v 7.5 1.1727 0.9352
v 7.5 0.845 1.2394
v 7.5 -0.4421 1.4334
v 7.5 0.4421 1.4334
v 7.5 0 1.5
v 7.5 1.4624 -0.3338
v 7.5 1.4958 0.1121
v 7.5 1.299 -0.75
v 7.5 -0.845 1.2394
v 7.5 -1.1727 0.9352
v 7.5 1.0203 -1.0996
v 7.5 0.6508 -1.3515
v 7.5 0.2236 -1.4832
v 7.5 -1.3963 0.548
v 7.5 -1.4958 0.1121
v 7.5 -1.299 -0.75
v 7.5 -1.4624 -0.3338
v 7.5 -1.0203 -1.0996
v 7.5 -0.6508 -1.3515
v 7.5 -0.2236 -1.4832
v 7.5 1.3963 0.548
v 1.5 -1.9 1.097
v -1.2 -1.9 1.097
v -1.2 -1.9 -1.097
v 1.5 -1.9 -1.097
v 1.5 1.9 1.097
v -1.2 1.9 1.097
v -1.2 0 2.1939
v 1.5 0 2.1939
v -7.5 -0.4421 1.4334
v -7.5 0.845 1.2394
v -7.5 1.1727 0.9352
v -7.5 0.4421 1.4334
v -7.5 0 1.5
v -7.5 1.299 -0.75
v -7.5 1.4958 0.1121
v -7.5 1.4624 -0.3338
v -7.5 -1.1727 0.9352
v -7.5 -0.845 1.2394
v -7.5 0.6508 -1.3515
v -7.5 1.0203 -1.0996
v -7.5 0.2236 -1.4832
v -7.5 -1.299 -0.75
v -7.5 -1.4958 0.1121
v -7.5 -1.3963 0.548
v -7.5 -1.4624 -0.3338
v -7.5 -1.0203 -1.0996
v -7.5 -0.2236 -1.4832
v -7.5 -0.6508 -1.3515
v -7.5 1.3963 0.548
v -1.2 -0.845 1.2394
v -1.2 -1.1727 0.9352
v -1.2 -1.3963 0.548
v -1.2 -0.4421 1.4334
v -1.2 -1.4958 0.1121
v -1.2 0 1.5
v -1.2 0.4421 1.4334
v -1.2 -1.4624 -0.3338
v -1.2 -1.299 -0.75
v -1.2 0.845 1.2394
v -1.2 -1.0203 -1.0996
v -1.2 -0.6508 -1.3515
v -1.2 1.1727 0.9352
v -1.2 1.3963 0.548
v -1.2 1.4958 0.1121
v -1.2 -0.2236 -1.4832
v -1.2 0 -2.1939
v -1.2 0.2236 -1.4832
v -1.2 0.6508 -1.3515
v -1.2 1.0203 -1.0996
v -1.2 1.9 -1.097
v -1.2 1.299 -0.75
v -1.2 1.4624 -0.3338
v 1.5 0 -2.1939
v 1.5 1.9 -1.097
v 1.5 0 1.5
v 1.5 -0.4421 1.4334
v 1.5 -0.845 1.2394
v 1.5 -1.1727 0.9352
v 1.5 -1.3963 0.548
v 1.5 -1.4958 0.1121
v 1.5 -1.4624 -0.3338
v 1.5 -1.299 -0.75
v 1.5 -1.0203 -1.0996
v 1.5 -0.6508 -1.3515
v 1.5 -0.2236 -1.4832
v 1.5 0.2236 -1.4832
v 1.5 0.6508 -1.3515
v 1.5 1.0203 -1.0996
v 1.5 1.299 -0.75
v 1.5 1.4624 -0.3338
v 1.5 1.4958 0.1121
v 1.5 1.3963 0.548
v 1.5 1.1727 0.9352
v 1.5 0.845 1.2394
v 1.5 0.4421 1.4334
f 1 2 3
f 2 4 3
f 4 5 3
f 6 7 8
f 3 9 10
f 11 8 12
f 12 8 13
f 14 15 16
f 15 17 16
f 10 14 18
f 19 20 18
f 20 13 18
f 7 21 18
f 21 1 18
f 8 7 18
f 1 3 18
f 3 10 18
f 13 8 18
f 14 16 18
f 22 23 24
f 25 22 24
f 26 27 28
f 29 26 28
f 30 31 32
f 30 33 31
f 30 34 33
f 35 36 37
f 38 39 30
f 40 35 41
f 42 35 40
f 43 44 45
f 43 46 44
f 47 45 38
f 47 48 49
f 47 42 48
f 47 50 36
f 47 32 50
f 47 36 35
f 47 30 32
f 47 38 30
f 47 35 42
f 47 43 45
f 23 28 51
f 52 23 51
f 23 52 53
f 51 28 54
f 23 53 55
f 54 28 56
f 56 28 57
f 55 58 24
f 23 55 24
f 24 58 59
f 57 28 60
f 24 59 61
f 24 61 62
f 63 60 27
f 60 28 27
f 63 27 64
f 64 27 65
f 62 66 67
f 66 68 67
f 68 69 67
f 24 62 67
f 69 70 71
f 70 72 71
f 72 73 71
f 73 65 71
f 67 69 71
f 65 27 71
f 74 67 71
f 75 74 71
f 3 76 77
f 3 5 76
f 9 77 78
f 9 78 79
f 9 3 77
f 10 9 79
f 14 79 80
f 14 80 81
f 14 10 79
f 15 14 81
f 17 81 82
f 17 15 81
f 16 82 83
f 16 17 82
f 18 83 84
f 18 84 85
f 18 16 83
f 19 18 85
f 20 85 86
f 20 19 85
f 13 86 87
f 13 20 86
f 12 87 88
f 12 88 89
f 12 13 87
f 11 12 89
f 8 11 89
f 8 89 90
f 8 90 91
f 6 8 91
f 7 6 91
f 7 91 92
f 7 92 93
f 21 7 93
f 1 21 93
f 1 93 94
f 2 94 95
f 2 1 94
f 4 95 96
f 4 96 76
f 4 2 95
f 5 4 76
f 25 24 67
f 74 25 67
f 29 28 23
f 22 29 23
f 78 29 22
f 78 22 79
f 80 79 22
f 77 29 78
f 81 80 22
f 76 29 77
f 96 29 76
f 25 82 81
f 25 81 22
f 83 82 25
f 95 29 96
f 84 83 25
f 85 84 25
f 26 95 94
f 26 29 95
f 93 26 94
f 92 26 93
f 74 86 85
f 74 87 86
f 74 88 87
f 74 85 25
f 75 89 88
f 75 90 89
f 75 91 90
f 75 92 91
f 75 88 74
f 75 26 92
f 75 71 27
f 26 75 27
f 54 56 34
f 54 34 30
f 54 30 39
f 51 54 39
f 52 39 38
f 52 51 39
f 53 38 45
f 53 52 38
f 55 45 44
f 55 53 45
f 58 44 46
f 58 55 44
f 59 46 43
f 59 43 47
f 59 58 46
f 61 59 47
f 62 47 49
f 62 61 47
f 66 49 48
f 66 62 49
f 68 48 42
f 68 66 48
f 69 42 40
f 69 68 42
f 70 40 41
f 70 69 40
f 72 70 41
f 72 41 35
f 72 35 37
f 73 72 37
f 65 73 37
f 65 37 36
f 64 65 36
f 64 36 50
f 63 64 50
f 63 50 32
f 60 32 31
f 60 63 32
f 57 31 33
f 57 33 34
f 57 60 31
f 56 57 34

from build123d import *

# Parameters (mm, degrees)
SKETCH1_W                = 15
SKETCH1_H                = 1.5
BOSS_EXTRUDE1_DEPTH      = 1.5
BOSS_EXTRUDE1_DEPTH_BACK = 1.2


with BuildPart() as part:
    # Sketch1 → Revolve1 (revolve)
    with BuildSketch(Plane(origin=(0, 0, 0), x_dir=(1, 0, 0), z_dir=(0, 1, 0)), mode=Mode.PRIVATE) as revolve1_sk:
        with Locations((0, 0.75)):
            Rectangle(SKETCH1_W, SKETCH1_H)
    revolve(revolve1_sk.sketch.rotate(Axis((-19.553100844, 0, 0), (1, 0, 0)), 180), axis=Axis((-19.553100844, 0, 0), (1, 0, 0)))

    # Sketch2 → Boss-Extrude1 (add, two sides: drawn at the far end of the back side and taken through both)
    with BuildSketch(Plane(origin=(0, 0, 0), x_dir=(0, 0, -1), z_dir=(1, 0, 0)).offset(-BOSS_EXTRUDE1_DEPTH_BACK)):
        Polygon((2.193931023, 0), (1.096965511, 1.9), (-1.096965511, 1.9), (-2.193931023, 0), (-1.096965511, -1.9), (1.096965511, -1.9), align=None)
    extrude(amount=BOSS_EXTRUDE1_DEPTH + BOSS_EXTRUDE1_DEPTH_BACK)


solid = part.part
